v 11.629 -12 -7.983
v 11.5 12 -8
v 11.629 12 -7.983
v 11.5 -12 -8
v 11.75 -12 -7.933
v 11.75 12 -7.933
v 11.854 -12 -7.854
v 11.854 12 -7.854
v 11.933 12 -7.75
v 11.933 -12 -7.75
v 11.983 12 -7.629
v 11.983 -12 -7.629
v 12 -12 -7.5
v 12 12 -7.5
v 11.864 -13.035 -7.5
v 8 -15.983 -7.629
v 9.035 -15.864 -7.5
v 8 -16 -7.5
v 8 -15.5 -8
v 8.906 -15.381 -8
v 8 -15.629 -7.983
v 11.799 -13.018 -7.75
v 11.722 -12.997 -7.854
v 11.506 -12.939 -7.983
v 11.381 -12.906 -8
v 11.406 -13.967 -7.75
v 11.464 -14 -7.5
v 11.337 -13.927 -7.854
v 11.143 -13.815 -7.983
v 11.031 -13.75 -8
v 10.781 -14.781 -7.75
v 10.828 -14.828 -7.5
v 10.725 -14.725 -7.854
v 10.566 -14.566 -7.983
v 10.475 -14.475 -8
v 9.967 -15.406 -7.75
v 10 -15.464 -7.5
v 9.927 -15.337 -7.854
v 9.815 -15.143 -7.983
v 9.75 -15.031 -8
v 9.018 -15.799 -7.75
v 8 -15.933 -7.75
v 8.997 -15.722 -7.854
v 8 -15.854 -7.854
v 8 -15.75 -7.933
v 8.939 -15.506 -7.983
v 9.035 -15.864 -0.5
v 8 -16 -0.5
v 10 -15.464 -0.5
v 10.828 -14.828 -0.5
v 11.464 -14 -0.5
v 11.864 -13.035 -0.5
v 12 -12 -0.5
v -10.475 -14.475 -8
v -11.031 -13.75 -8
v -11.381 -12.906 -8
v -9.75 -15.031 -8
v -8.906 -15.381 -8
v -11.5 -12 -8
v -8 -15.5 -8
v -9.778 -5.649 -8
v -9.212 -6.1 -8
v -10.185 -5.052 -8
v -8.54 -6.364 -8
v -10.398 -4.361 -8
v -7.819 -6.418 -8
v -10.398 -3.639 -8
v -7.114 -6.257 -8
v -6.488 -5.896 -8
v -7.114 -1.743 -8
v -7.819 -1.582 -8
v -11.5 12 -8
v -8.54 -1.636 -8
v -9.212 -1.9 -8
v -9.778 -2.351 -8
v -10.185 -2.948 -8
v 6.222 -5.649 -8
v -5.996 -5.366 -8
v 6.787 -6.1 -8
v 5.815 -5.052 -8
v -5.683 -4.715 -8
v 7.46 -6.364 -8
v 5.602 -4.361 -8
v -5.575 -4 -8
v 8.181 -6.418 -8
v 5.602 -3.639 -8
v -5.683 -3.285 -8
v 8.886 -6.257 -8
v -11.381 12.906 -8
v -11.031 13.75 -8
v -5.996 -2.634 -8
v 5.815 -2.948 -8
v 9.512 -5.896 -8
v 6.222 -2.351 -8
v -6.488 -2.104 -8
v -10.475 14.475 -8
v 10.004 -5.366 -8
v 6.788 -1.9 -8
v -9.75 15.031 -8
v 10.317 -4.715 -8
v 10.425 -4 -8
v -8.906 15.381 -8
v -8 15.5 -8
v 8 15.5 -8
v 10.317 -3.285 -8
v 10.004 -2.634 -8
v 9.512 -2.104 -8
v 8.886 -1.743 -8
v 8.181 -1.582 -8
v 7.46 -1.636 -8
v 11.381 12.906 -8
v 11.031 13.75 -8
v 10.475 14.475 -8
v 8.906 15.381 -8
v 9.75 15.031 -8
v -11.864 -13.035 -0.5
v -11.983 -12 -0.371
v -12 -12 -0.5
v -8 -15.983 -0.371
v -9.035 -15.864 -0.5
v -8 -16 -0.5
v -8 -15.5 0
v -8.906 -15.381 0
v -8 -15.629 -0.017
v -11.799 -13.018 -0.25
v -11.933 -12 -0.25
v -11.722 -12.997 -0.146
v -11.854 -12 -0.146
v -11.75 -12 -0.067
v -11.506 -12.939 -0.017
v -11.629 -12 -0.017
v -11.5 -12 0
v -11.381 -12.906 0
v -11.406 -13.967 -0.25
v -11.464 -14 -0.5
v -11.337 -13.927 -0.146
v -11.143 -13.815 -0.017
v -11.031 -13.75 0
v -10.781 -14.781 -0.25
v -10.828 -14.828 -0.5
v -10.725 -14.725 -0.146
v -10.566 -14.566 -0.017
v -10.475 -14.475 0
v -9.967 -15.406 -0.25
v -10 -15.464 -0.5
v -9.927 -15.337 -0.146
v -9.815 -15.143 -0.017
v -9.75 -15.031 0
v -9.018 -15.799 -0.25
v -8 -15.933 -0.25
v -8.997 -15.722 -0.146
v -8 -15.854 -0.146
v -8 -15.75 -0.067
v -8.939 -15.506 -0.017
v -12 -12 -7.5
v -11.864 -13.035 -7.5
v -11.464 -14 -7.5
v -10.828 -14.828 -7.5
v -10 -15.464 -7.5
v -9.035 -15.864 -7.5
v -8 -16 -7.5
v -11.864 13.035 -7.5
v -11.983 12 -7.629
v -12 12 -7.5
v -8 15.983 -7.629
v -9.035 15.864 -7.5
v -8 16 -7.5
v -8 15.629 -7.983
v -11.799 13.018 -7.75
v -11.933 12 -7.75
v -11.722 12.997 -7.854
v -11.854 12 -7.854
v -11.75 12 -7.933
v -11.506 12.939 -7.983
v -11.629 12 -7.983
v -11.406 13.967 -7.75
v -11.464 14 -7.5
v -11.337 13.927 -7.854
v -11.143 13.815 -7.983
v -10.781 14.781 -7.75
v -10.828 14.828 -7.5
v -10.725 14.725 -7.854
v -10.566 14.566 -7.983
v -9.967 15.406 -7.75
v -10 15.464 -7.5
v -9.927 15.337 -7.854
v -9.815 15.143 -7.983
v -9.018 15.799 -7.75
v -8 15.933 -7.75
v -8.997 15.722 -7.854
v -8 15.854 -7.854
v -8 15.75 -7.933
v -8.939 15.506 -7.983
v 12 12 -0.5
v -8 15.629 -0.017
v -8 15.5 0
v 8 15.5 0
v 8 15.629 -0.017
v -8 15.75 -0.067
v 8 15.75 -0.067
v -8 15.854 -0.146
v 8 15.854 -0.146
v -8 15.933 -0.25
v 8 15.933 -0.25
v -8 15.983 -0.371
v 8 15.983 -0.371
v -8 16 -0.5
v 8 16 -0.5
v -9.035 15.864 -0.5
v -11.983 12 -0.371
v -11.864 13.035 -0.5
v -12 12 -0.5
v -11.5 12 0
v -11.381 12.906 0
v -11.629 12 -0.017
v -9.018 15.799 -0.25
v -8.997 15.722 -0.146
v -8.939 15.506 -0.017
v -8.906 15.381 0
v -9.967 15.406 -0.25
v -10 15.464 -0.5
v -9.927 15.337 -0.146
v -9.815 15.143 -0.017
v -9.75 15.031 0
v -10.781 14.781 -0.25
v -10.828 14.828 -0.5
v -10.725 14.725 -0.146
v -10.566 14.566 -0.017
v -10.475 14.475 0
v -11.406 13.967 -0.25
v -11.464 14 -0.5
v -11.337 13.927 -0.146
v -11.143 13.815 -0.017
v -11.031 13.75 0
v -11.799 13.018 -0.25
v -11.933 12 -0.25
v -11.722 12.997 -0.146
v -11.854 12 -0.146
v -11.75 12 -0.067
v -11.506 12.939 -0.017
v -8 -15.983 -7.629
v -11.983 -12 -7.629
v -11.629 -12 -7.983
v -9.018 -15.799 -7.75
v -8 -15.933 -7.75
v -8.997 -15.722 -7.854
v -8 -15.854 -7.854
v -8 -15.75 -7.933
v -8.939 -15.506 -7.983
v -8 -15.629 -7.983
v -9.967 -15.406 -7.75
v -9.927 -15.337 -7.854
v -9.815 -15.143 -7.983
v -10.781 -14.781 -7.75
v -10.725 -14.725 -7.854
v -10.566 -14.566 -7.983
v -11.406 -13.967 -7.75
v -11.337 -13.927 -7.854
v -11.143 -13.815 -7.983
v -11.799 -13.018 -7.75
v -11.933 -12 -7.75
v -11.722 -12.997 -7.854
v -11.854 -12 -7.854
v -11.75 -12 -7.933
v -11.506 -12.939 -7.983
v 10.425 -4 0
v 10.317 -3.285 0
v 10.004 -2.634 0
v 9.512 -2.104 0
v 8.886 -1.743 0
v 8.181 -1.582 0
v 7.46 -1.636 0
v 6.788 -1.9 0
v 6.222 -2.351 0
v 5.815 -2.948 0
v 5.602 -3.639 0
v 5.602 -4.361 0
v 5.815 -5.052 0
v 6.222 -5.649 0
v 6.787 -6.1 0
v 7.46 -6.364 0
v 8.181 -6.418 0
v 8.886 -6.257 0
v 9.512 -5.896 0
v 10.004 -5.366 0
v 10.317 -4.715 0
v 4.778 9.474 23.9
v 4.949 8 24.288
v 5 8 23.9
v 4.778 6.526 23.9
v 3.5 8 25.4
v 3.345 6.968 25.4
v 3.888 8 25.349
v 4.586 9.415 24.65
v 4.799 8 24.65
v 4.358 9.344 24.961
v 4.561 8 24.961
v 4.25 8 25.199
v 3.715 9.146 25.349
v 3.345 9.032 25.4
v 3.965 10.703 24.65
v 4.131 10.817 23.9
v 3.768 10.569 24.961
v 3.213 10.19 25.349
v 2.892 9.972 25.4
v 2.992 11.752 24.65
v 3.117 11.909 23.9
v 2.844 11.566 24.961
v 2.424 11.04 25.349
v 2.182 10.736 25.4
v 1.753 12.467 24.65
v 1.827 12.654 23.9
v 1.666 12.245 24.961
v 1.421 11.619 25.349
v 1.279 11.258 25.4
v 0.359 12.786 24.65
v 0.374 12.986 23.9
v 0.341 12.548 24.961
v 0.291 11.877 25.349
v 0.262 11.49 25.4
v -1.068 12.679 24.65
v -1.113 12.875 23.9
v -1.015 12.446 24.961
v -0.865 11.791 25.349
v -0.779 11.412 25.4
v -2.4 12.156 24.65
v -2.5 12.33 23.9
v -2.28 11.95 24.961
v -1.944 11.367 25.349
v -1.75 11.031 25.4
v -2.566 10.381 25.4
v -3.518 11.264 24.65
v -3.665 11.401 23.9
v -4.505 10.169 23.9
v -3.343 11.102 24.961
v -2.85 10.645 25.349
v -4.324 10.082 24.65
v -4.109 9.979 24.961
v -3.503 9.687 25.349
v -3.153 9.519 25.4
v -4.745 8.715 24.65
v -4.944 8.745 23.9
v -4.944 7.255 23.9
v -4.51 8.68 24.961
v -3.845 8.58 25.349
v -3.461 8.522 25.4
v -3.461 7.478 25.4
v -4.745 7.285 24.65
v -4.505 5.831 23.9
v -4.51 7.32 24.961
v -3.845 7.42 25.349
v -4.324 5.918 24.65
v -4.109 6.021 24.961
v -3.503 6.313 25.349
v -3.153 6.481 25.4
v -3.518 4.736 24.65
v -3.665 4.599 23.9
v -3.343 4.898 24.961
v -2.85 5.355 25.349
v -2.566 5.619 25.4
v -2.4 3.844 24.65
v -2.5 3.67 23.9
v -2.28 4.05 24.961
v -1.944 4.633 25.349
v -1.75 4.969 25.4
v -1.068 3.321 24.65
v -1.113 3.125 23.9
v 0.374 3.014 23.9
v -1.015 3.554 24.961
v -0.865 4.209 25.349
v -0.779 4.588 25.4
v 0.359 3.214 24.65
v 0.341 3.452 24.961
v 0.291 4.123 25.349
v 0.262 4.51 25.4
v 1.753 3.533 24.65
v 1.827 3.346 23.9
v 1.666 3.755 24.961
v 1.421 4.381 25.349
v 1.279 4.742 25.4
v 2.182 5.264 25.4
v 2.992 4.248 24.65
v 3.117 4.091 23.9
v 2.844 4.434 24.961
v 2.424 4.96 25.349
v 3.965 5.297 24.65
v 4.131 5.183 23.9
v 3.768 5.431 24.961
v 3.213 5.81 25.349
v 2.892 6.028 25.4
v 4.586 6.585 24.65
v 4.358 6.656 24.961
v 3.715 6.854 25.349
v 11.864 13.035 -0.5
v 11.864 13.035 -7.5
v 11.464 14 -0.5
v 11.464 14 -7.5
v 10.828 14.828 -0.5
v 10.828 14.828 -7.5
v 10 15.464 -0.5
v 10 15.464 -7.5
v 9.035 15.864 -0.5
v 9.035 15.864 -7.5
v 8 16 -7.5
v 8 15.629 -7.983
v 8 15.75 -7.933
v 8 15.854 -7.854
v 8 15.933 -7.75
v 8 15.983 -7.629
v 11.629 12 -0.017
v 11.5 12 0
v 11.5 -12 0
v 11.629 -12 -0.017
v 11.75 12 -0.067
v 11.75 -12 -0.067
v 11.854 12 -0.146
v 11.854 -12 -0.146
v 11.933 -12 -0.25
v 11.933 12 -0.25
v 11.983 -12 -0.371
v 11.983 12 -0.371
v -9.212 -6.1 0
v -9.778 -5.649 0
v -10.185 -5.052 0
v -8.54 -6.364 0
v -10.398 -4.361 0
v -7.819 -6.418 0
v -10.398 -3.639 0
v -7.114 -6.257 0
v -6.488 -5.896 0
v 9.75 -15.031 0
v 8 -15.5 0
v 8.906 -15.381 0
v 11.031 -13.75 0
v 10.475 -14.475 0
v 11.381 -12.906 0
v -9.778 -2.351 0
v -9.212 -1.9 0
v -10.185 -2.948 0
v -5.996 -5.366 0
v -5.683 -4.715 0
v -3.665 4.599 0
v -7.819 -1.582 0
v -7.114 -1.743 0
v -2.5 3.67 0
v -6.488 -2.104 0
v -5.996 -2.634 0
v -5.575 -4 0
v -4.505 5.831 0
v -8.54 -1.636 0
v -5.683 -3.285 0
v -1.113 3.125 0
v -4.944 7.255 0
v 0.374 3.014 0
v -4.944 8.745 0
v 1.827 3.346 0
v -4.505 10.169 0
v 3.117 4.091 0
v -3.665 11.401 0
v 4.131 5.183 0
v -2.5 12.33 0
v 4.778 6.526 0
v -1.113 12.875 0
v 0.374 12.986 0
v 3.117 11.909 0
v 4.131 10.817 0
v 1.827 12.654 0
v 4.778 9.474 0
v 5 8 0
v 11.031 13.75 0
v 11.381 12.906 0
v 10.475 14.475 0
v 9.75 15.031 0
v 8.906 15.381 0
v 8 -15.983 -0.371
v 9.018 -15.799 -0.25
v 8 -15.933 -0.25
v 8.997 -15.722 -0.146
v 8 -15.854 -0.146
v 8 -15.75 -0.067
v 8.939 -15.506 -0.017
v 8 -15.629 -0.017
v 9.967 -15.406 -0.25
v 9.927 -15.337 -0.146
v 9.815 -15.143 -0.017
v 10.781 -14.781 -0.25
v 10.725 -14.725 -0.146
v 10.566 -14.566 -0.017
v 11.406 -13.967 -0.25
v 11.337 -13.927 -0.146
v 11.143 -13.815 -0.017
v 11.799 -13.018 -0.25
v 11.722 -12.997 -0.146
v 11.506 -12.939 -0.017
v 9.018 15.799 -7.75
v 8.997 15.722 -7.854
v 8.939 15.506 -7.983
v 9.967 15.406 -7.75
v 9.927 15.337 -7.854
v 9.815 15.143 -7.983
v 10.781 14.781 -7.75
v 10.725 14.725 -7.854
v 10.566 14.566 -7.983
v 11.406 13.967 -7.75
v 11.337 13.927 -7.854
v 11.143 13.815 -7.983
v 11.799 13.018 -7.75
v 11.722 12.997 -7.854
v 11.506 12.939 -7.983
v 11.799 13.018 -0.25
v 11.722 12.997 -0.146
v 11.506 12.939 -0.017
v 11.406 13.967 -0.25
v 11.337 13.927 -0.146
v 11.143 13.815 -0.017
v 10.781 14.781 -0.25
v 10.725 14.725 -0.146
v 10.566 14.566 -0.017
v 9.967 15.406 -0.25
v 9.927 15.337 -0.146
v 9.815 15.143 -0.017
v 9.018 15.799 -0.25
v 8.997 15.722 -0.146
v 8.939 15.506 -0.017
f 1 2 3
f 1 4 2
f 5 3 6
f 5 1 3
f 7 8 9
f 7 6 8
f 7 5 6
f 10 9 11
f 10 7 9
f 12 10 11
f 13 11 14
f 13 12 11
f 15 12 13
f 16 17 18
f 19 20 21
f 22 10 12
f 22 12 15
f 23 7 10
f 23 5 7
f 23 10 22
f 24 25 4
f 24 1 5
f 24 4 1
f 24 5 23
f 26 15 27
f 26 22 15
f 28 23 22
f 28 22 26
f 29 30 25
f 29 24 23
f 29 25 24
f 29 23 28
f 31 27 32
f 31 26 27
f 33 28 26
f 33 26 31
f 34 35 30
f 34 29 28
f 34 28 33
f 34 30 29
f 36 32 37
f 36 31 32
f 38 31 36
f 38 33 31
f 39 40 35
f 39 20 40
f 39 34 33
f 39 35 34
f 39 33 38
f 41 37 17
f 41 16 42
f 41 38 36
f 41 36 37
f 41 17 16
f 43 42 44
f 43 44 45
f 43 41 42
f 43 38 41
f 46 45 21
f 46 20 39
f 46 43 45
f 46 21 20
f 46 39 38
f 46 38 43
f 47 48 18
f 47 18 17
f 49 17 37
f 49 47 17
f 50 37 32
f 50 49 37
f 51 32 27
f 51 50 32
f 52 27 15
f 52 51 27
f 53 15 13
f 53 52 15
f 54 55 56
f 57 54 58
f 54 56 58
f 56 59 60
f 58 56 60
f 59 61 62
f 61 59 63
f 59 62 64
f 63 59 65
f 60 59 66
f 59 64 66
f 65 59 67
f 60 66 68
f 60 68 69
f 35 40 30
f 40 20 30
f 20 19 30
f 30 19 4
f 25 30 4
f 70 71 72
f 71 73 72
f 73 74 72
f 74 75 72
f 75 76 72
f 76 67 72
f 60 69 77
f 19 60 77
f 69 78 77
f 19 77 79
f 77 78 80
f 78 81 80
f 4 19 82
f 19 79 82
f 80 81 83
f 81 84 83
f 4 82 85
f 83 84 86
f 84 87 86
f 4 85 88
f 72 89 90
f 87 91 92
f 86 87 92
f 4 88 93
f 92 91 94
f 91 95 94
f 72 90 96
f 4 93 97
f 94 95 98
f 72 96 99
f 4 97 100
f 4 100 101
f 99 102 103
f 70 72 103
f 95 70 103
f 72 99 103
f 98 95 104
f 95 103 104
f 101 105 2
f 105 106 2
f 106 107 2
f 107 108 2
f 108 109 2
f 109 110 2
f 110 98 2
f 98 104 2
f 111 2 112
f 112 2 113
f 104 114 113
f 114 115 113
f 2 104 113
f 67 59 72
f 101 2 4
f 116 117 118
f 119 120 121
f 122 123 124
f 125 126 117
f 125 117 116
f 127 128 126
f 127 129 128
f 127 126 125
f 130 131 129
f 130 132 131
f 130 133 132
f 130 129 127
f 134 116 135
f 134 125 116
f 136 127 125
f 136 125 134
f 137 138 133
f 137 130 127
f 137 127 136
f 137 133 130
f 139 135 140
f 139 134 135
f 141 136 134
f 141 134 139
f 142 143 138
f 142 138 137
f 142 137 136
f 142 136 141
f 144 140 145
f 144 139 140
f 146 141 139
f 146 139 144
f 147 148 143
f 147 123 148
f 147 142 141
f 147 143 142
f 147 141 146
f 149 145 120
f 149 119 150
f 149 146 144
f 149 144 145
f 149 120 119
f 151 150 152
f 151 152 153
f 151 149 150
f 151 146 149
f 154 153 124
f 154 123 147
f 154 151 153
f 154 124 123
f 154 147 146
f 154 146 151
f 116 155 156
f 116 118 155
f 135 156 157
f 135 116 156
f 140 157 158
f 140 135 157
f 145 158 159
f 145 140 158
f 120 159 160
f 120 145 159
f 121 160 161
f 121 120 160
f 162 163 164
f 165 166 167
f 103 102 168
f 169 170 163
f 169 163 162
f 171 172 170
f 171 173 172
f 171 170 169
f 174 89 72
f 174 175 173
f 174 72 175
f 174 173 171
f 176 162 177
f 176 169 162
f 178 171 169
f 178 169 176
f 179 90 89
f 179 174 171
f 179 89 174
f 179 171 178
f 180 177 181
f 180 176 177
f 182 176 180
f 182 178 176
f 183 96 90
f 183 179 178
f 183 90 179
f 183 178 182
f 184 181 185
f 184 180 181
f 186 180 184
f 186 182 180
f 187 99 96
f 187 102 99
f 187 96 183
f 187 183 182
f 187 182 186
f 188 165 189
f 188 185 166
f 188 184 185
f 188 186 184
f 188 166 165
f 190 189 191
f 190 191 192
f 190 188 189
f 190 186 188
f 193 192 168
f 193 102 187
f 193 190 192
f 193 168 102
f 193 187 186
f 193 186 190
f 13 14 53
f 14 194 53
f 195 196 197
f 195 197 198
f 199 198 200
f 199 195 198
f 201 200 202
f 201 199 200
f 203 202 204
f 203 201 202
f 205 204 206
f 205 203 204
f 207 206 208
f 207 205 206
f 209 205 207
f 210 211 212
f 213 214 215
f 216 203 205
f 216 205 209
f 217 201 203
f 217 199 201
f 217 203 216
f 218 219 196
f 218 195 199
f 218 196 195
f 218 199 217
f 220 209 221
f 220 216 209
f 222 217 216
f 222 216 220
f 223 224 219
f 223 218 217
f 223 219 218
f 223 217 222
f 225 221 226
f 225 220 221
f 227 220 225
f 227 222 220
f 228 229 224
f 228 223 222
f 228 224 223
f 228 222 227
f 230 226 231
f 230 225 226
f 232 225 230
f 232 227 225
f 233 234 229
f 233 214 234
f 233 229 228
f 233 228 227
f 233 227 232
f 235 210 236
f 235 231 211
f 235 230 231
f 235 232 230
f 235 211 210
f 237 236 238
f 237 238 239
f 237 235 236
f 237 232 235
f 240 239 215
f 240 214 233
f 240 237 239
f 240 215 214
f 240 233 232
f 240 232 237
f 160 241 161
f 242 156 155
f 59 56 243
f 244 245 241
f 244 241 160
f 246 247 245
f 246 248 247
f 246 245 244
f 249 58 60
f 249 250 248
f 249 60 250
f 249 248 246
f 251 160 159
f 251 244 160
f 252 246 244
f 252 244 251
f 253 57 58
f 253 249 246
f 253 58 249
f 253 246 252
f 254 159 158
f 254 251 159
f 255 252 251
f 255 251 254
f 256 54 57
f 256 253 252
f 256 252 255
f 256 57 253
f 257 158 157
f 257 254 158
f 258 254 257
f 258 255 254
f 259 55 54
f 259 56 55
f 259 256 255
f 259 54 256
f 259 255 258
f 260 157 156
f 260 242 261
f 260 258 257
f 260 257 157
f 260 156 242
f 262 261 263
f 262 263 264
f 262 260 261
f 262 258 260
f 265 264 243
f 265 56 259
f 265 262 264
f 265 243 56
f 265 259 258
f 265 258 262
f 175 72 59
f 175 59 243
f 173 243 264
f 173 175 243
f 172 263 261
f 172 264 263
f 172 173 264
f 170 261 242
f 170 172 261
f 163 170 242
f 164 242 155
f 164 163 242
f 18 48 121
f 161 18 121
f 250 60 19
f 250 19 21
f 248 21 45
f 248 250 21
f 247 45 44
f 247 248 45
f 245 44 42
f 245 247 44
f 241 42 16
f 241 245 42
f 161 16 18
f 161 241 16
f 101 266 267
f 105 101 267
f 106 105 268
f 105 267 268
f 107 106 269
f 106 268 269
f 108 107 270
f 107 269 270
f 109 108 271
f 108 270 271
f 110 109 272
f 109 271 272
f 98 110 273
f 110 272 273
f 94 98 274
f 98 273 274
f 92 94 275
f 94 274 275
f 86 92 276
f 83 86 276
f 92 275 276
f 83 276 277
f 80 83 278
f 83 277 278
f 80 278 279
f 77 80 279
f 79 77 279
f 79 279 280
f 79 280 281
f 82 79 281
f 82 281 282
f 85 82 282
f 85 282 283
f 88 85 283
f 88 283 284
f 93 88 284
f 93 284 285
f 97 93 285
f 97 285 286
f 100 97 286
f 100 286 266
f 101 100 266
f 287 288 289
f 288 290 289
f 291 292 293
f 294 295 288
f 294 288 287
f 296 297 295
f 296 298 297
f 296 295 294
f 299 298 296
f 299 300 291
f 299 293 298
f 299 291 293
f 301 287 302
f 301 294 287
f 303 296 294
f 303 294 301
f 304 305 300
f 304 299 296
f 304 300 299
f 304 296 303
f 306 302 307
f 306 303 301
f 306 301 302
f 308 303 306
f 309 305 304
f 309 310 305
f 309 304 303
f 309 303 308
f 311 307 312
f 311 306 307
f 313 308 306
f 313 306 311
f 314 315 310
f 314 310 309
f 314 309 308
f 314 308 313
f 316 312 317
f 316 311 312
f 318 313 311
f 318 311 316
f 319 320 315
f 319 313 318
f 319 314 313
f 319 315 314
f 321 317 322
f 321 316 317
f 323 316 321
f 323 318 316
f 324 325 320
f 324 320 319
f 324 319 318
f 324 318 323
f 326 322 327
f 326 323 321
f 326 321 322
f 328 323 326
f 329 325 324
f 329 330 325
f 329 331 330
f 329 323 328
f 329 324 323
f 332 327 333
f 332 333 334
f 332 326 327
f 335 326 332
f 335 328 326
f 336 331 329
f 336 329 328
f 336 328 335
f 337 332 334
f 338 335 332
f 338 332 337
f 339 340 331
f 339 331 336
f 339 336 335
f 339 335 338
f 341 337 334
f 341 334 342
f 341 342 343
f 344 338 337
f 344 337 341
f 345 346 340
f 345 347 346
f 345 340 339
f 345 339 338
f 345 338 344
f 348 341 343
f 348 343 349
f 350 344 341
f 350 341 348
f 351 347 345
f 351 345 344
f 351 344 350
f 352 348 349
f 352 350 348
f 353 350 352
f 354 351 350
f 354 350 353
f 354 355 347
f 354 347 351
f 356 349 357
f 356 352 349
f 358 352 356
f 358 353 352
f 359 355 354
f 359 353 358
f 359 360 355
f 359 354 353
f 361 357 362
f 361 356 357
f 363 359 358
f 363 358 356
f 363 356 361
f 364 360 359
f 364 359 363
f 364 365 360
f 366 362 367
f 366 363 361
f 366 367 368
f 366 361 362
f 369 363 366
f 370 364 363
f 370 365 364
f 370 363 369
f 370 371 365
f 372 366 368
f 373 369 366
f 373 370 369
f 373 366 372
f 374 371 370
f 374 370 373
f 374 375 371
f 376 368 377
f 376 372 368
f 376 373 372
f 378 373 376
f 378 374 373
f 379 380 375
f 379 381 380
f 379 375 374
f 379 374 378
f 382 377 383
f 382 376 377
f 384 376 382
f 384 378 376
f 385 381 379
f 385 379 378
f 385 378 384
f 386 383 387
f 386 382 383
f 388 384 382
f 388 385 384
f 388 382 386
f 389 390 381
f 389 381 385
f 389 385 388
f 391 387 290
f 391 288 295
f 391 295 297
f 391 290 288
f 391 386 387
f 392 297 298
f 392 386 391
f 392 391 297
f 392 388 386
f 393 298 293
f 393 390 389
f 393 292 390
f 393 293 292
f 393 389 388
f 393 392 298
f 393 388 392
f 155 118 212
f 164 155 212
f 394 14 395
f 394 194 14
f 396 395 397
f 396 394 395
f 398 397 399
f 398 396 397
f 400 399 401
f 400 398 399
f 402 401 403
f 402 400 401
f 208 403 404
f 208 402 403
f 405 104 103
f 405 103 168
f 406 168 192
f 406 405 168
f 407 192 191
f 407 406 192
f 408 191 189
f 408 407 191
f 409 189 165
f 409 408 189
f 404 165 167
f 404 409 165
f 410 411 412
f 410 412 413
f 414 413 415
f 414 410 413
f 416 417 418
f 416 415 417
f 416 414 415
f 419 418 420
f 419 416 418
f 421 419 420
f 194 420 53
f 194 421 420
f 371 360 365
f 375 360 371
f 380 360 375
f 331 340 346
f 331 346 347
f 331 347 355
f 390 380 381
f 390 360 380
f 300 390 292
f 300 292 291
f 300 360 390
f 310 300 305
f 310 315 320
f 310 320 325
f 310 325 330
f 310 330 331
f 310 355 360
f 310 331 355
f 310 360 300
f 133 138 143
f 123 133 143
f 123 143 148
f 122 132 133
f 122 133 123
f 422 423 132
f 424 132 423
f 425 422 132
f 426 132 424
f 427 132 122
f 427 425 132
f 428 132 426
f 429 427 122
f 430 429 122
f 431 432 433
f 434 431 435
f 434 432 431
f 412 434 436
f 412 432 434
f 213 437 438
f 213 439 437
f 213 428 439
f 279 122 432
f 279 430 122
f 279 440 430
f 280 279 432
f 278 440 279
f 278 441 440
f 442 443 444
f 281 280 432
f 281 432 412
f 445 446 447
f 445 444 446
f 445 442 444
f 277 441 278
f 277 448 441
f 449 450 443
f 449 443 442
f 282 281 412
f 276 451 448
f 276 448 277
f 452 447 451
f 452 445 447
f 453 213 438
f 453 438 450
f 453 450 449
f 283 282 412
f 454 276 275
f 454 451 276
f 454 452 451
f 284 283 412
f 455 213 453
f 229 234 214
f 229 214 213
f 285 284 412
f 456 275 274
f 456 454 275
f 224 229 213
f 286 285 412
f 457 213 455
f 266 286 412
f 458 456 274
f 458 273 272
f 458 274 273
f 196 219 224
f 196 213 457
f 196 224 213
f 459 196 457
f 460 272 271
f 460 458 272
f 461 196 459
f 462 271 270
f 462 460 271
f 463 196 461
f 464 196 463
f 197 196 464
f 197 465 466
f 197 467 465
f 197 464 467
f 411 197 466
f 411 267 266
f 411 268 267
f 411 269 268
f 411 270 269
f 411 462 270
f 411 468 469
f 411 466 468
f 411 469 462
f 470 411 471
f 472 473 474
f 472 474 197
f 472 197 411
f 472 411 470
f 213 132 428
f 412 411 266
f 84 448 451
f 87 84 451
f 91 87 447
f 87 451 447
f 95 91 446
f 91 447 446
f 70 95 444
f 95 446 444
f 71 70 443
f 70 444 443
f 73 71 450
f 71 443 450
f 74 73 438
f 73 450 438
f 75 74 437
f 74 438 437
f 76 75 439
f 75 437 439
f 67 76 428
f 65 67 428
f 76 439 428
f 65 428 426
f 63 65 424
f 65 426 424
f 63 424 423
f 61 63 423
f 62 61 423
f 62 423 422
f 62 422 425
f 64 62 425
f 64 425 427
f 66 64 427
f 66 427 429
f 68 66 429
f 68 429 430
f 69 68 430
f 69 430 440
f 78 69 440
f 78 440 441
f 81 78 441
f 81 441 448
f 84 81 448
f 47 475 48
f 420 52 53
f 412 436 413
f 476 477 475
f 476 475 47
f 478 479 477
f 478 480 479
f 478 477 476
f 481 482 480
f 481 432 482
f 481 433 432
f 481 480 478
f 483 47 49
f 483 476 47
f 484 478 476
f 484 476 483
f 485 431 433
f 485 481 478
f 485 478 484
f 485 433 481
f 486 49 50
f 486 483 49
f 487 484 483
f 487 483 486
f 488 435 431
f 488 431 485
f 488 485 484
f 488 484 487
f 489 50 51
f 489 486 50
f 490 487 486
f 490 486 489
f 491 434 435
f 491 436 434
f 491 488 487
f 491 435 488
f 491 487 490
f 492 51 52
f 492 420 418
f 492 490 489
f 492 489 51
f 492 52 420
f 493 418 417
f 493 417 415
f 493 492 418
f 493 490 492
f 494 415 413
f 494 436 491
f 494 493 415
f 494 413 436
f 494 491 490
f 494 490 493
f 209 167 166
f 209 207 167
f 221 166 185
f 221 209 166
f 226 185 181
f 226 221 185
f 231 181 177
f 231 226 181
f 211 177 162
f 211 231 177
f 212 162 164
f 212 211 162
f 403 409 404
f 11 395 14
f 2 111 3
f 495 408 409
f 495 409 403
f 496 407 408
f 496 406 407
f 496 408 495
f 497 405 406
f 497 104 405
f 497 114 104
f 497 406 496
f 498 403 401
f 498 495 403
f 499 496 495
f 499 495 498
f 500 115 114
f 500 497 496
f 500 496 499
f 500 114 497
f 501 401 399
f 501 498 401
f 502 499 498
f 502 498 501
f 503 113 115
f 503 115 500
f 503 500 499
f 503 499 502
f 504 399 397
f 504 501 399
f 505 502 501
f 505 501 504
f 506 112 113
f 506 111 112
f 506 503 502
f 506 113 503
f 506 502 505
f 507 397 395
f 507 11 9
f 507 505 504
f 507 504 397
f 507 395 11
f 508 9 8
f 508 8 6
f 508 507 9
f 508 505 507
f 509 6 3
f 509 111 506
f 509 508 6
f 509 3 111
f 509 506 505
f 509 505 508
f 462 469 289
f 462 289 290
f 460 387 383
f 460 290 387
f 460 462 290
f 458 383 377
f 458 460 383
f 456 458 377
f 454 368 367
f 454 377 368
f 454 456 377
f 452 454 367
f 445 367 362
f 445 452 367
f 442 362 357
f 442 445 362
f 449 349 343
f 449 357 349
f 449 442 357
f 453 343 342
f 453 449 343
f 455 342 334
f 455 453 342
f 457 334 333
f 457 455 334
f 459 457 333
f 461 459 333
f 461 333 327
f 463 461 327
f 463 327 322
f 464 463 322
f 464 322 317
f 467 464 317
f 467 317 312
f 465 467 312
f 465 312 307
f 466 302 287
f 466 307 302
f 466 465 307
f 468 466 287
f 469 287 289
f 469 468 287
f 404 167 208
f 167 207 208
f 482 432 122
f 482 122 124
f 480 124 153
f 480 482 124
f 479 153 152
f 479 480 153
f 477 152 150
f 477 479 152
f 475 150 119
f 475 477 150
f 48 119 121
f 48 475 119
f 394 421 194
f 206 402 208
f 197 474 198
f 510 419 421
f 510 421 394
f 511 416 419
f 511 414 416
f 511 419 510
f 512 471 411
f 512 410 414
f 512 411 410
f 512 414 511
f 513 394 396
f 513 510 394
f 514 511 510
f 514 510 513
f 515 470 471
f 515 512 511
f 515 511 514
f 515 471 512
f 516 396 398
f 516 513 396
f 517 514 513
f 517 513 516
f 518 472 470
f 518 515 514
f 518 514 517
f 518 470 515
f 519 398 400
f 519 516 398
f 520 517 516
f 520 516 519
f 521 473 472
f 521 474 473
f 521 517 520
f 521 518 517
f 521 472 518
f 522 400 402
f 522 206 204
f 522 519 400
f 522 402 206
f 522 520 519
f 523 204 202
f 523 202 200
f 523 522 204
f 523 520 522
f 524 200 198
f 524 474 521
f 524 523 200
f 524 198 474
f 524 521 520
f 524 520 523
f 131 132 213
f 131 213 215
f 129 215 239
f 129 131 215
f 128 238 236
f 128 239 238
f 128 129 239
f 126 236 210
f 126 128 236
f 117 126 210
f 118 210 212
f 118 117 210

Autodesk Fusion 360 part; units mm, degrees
sketch "Esquisse1" plane through (0, 0, 0) normal (0, 0, 1) x (1, 0, 0)
  line L0 (8, -16) -> (-8, -16)
  line L1 (-12, -12) -> (-12, 12)
  line L2 (-8, 16) -> (8, 16)
  line L3 (12, 12) -> (12, -12)
  line L4 (12, -16) -> (-12, 16) construction
  line L5 (-12, -16) -> (12, 16) construction
  circle A0 centre (-8, -4) radius 2.425
  circle A1 centre (8, -4) radius 2.425
  circle A2 centre (0, 8) radius 5
  arc A3 (-12, -12) -> (-8, -16) centre (-8, -12) ccw
  arc A4 (8, -16) -> (12, -12) centre (8, -12) ccw
  arc A5 (12, 12) -> (8, 16) centre (8, 12) ccw
  arc A6 (-8, 16) -> (-12, 12) centre (-8, 12) ccw
  dimension "d1" = 24
  dimension "d2" = 32
  dimension "d3" = 4.85
  dimension "d4" = 4.85
  dimension "d5" = 12
  dimension "d6" = 12
  dimension "d7" = 16
  dimension "d8" = 10
  dimension "d9" = 8
  dimension "d10" = 4
extrude "Extrusion1" add sketch "Esquisse1" against normal blind 8 contours L0 L1 L2 L3 A3 A4 A5 A6 | A2
extrude "Extrusion2" add sketch "Esquisse1" along normal blind 25.4 contours A2
fillet "Congé1" radius 0.5 16 edges at (0, -16, -8) (-10.8284, -14.8284, -8) (-12, 0, -8) (-10.8284, 14.8284, -8) (0, 16, -8) (10.8284, 14.8284, -8) (12, 0, -8) (10.8284, -14.8284, -8) (10.8284, -14.8284, 0) (0, -16, 0) (-10.8284, -14.8284, 0) (-12, 0, 0) (-10.8284, 14.8284, 0) (0, 16, 0) (10.8284, 14.8284, 0) (12, 0, 0)
fillet "Congé2" radius 1.5 1 edges at (-4.6616, 6.1919, 25.4)
equation "d6 = d5"
